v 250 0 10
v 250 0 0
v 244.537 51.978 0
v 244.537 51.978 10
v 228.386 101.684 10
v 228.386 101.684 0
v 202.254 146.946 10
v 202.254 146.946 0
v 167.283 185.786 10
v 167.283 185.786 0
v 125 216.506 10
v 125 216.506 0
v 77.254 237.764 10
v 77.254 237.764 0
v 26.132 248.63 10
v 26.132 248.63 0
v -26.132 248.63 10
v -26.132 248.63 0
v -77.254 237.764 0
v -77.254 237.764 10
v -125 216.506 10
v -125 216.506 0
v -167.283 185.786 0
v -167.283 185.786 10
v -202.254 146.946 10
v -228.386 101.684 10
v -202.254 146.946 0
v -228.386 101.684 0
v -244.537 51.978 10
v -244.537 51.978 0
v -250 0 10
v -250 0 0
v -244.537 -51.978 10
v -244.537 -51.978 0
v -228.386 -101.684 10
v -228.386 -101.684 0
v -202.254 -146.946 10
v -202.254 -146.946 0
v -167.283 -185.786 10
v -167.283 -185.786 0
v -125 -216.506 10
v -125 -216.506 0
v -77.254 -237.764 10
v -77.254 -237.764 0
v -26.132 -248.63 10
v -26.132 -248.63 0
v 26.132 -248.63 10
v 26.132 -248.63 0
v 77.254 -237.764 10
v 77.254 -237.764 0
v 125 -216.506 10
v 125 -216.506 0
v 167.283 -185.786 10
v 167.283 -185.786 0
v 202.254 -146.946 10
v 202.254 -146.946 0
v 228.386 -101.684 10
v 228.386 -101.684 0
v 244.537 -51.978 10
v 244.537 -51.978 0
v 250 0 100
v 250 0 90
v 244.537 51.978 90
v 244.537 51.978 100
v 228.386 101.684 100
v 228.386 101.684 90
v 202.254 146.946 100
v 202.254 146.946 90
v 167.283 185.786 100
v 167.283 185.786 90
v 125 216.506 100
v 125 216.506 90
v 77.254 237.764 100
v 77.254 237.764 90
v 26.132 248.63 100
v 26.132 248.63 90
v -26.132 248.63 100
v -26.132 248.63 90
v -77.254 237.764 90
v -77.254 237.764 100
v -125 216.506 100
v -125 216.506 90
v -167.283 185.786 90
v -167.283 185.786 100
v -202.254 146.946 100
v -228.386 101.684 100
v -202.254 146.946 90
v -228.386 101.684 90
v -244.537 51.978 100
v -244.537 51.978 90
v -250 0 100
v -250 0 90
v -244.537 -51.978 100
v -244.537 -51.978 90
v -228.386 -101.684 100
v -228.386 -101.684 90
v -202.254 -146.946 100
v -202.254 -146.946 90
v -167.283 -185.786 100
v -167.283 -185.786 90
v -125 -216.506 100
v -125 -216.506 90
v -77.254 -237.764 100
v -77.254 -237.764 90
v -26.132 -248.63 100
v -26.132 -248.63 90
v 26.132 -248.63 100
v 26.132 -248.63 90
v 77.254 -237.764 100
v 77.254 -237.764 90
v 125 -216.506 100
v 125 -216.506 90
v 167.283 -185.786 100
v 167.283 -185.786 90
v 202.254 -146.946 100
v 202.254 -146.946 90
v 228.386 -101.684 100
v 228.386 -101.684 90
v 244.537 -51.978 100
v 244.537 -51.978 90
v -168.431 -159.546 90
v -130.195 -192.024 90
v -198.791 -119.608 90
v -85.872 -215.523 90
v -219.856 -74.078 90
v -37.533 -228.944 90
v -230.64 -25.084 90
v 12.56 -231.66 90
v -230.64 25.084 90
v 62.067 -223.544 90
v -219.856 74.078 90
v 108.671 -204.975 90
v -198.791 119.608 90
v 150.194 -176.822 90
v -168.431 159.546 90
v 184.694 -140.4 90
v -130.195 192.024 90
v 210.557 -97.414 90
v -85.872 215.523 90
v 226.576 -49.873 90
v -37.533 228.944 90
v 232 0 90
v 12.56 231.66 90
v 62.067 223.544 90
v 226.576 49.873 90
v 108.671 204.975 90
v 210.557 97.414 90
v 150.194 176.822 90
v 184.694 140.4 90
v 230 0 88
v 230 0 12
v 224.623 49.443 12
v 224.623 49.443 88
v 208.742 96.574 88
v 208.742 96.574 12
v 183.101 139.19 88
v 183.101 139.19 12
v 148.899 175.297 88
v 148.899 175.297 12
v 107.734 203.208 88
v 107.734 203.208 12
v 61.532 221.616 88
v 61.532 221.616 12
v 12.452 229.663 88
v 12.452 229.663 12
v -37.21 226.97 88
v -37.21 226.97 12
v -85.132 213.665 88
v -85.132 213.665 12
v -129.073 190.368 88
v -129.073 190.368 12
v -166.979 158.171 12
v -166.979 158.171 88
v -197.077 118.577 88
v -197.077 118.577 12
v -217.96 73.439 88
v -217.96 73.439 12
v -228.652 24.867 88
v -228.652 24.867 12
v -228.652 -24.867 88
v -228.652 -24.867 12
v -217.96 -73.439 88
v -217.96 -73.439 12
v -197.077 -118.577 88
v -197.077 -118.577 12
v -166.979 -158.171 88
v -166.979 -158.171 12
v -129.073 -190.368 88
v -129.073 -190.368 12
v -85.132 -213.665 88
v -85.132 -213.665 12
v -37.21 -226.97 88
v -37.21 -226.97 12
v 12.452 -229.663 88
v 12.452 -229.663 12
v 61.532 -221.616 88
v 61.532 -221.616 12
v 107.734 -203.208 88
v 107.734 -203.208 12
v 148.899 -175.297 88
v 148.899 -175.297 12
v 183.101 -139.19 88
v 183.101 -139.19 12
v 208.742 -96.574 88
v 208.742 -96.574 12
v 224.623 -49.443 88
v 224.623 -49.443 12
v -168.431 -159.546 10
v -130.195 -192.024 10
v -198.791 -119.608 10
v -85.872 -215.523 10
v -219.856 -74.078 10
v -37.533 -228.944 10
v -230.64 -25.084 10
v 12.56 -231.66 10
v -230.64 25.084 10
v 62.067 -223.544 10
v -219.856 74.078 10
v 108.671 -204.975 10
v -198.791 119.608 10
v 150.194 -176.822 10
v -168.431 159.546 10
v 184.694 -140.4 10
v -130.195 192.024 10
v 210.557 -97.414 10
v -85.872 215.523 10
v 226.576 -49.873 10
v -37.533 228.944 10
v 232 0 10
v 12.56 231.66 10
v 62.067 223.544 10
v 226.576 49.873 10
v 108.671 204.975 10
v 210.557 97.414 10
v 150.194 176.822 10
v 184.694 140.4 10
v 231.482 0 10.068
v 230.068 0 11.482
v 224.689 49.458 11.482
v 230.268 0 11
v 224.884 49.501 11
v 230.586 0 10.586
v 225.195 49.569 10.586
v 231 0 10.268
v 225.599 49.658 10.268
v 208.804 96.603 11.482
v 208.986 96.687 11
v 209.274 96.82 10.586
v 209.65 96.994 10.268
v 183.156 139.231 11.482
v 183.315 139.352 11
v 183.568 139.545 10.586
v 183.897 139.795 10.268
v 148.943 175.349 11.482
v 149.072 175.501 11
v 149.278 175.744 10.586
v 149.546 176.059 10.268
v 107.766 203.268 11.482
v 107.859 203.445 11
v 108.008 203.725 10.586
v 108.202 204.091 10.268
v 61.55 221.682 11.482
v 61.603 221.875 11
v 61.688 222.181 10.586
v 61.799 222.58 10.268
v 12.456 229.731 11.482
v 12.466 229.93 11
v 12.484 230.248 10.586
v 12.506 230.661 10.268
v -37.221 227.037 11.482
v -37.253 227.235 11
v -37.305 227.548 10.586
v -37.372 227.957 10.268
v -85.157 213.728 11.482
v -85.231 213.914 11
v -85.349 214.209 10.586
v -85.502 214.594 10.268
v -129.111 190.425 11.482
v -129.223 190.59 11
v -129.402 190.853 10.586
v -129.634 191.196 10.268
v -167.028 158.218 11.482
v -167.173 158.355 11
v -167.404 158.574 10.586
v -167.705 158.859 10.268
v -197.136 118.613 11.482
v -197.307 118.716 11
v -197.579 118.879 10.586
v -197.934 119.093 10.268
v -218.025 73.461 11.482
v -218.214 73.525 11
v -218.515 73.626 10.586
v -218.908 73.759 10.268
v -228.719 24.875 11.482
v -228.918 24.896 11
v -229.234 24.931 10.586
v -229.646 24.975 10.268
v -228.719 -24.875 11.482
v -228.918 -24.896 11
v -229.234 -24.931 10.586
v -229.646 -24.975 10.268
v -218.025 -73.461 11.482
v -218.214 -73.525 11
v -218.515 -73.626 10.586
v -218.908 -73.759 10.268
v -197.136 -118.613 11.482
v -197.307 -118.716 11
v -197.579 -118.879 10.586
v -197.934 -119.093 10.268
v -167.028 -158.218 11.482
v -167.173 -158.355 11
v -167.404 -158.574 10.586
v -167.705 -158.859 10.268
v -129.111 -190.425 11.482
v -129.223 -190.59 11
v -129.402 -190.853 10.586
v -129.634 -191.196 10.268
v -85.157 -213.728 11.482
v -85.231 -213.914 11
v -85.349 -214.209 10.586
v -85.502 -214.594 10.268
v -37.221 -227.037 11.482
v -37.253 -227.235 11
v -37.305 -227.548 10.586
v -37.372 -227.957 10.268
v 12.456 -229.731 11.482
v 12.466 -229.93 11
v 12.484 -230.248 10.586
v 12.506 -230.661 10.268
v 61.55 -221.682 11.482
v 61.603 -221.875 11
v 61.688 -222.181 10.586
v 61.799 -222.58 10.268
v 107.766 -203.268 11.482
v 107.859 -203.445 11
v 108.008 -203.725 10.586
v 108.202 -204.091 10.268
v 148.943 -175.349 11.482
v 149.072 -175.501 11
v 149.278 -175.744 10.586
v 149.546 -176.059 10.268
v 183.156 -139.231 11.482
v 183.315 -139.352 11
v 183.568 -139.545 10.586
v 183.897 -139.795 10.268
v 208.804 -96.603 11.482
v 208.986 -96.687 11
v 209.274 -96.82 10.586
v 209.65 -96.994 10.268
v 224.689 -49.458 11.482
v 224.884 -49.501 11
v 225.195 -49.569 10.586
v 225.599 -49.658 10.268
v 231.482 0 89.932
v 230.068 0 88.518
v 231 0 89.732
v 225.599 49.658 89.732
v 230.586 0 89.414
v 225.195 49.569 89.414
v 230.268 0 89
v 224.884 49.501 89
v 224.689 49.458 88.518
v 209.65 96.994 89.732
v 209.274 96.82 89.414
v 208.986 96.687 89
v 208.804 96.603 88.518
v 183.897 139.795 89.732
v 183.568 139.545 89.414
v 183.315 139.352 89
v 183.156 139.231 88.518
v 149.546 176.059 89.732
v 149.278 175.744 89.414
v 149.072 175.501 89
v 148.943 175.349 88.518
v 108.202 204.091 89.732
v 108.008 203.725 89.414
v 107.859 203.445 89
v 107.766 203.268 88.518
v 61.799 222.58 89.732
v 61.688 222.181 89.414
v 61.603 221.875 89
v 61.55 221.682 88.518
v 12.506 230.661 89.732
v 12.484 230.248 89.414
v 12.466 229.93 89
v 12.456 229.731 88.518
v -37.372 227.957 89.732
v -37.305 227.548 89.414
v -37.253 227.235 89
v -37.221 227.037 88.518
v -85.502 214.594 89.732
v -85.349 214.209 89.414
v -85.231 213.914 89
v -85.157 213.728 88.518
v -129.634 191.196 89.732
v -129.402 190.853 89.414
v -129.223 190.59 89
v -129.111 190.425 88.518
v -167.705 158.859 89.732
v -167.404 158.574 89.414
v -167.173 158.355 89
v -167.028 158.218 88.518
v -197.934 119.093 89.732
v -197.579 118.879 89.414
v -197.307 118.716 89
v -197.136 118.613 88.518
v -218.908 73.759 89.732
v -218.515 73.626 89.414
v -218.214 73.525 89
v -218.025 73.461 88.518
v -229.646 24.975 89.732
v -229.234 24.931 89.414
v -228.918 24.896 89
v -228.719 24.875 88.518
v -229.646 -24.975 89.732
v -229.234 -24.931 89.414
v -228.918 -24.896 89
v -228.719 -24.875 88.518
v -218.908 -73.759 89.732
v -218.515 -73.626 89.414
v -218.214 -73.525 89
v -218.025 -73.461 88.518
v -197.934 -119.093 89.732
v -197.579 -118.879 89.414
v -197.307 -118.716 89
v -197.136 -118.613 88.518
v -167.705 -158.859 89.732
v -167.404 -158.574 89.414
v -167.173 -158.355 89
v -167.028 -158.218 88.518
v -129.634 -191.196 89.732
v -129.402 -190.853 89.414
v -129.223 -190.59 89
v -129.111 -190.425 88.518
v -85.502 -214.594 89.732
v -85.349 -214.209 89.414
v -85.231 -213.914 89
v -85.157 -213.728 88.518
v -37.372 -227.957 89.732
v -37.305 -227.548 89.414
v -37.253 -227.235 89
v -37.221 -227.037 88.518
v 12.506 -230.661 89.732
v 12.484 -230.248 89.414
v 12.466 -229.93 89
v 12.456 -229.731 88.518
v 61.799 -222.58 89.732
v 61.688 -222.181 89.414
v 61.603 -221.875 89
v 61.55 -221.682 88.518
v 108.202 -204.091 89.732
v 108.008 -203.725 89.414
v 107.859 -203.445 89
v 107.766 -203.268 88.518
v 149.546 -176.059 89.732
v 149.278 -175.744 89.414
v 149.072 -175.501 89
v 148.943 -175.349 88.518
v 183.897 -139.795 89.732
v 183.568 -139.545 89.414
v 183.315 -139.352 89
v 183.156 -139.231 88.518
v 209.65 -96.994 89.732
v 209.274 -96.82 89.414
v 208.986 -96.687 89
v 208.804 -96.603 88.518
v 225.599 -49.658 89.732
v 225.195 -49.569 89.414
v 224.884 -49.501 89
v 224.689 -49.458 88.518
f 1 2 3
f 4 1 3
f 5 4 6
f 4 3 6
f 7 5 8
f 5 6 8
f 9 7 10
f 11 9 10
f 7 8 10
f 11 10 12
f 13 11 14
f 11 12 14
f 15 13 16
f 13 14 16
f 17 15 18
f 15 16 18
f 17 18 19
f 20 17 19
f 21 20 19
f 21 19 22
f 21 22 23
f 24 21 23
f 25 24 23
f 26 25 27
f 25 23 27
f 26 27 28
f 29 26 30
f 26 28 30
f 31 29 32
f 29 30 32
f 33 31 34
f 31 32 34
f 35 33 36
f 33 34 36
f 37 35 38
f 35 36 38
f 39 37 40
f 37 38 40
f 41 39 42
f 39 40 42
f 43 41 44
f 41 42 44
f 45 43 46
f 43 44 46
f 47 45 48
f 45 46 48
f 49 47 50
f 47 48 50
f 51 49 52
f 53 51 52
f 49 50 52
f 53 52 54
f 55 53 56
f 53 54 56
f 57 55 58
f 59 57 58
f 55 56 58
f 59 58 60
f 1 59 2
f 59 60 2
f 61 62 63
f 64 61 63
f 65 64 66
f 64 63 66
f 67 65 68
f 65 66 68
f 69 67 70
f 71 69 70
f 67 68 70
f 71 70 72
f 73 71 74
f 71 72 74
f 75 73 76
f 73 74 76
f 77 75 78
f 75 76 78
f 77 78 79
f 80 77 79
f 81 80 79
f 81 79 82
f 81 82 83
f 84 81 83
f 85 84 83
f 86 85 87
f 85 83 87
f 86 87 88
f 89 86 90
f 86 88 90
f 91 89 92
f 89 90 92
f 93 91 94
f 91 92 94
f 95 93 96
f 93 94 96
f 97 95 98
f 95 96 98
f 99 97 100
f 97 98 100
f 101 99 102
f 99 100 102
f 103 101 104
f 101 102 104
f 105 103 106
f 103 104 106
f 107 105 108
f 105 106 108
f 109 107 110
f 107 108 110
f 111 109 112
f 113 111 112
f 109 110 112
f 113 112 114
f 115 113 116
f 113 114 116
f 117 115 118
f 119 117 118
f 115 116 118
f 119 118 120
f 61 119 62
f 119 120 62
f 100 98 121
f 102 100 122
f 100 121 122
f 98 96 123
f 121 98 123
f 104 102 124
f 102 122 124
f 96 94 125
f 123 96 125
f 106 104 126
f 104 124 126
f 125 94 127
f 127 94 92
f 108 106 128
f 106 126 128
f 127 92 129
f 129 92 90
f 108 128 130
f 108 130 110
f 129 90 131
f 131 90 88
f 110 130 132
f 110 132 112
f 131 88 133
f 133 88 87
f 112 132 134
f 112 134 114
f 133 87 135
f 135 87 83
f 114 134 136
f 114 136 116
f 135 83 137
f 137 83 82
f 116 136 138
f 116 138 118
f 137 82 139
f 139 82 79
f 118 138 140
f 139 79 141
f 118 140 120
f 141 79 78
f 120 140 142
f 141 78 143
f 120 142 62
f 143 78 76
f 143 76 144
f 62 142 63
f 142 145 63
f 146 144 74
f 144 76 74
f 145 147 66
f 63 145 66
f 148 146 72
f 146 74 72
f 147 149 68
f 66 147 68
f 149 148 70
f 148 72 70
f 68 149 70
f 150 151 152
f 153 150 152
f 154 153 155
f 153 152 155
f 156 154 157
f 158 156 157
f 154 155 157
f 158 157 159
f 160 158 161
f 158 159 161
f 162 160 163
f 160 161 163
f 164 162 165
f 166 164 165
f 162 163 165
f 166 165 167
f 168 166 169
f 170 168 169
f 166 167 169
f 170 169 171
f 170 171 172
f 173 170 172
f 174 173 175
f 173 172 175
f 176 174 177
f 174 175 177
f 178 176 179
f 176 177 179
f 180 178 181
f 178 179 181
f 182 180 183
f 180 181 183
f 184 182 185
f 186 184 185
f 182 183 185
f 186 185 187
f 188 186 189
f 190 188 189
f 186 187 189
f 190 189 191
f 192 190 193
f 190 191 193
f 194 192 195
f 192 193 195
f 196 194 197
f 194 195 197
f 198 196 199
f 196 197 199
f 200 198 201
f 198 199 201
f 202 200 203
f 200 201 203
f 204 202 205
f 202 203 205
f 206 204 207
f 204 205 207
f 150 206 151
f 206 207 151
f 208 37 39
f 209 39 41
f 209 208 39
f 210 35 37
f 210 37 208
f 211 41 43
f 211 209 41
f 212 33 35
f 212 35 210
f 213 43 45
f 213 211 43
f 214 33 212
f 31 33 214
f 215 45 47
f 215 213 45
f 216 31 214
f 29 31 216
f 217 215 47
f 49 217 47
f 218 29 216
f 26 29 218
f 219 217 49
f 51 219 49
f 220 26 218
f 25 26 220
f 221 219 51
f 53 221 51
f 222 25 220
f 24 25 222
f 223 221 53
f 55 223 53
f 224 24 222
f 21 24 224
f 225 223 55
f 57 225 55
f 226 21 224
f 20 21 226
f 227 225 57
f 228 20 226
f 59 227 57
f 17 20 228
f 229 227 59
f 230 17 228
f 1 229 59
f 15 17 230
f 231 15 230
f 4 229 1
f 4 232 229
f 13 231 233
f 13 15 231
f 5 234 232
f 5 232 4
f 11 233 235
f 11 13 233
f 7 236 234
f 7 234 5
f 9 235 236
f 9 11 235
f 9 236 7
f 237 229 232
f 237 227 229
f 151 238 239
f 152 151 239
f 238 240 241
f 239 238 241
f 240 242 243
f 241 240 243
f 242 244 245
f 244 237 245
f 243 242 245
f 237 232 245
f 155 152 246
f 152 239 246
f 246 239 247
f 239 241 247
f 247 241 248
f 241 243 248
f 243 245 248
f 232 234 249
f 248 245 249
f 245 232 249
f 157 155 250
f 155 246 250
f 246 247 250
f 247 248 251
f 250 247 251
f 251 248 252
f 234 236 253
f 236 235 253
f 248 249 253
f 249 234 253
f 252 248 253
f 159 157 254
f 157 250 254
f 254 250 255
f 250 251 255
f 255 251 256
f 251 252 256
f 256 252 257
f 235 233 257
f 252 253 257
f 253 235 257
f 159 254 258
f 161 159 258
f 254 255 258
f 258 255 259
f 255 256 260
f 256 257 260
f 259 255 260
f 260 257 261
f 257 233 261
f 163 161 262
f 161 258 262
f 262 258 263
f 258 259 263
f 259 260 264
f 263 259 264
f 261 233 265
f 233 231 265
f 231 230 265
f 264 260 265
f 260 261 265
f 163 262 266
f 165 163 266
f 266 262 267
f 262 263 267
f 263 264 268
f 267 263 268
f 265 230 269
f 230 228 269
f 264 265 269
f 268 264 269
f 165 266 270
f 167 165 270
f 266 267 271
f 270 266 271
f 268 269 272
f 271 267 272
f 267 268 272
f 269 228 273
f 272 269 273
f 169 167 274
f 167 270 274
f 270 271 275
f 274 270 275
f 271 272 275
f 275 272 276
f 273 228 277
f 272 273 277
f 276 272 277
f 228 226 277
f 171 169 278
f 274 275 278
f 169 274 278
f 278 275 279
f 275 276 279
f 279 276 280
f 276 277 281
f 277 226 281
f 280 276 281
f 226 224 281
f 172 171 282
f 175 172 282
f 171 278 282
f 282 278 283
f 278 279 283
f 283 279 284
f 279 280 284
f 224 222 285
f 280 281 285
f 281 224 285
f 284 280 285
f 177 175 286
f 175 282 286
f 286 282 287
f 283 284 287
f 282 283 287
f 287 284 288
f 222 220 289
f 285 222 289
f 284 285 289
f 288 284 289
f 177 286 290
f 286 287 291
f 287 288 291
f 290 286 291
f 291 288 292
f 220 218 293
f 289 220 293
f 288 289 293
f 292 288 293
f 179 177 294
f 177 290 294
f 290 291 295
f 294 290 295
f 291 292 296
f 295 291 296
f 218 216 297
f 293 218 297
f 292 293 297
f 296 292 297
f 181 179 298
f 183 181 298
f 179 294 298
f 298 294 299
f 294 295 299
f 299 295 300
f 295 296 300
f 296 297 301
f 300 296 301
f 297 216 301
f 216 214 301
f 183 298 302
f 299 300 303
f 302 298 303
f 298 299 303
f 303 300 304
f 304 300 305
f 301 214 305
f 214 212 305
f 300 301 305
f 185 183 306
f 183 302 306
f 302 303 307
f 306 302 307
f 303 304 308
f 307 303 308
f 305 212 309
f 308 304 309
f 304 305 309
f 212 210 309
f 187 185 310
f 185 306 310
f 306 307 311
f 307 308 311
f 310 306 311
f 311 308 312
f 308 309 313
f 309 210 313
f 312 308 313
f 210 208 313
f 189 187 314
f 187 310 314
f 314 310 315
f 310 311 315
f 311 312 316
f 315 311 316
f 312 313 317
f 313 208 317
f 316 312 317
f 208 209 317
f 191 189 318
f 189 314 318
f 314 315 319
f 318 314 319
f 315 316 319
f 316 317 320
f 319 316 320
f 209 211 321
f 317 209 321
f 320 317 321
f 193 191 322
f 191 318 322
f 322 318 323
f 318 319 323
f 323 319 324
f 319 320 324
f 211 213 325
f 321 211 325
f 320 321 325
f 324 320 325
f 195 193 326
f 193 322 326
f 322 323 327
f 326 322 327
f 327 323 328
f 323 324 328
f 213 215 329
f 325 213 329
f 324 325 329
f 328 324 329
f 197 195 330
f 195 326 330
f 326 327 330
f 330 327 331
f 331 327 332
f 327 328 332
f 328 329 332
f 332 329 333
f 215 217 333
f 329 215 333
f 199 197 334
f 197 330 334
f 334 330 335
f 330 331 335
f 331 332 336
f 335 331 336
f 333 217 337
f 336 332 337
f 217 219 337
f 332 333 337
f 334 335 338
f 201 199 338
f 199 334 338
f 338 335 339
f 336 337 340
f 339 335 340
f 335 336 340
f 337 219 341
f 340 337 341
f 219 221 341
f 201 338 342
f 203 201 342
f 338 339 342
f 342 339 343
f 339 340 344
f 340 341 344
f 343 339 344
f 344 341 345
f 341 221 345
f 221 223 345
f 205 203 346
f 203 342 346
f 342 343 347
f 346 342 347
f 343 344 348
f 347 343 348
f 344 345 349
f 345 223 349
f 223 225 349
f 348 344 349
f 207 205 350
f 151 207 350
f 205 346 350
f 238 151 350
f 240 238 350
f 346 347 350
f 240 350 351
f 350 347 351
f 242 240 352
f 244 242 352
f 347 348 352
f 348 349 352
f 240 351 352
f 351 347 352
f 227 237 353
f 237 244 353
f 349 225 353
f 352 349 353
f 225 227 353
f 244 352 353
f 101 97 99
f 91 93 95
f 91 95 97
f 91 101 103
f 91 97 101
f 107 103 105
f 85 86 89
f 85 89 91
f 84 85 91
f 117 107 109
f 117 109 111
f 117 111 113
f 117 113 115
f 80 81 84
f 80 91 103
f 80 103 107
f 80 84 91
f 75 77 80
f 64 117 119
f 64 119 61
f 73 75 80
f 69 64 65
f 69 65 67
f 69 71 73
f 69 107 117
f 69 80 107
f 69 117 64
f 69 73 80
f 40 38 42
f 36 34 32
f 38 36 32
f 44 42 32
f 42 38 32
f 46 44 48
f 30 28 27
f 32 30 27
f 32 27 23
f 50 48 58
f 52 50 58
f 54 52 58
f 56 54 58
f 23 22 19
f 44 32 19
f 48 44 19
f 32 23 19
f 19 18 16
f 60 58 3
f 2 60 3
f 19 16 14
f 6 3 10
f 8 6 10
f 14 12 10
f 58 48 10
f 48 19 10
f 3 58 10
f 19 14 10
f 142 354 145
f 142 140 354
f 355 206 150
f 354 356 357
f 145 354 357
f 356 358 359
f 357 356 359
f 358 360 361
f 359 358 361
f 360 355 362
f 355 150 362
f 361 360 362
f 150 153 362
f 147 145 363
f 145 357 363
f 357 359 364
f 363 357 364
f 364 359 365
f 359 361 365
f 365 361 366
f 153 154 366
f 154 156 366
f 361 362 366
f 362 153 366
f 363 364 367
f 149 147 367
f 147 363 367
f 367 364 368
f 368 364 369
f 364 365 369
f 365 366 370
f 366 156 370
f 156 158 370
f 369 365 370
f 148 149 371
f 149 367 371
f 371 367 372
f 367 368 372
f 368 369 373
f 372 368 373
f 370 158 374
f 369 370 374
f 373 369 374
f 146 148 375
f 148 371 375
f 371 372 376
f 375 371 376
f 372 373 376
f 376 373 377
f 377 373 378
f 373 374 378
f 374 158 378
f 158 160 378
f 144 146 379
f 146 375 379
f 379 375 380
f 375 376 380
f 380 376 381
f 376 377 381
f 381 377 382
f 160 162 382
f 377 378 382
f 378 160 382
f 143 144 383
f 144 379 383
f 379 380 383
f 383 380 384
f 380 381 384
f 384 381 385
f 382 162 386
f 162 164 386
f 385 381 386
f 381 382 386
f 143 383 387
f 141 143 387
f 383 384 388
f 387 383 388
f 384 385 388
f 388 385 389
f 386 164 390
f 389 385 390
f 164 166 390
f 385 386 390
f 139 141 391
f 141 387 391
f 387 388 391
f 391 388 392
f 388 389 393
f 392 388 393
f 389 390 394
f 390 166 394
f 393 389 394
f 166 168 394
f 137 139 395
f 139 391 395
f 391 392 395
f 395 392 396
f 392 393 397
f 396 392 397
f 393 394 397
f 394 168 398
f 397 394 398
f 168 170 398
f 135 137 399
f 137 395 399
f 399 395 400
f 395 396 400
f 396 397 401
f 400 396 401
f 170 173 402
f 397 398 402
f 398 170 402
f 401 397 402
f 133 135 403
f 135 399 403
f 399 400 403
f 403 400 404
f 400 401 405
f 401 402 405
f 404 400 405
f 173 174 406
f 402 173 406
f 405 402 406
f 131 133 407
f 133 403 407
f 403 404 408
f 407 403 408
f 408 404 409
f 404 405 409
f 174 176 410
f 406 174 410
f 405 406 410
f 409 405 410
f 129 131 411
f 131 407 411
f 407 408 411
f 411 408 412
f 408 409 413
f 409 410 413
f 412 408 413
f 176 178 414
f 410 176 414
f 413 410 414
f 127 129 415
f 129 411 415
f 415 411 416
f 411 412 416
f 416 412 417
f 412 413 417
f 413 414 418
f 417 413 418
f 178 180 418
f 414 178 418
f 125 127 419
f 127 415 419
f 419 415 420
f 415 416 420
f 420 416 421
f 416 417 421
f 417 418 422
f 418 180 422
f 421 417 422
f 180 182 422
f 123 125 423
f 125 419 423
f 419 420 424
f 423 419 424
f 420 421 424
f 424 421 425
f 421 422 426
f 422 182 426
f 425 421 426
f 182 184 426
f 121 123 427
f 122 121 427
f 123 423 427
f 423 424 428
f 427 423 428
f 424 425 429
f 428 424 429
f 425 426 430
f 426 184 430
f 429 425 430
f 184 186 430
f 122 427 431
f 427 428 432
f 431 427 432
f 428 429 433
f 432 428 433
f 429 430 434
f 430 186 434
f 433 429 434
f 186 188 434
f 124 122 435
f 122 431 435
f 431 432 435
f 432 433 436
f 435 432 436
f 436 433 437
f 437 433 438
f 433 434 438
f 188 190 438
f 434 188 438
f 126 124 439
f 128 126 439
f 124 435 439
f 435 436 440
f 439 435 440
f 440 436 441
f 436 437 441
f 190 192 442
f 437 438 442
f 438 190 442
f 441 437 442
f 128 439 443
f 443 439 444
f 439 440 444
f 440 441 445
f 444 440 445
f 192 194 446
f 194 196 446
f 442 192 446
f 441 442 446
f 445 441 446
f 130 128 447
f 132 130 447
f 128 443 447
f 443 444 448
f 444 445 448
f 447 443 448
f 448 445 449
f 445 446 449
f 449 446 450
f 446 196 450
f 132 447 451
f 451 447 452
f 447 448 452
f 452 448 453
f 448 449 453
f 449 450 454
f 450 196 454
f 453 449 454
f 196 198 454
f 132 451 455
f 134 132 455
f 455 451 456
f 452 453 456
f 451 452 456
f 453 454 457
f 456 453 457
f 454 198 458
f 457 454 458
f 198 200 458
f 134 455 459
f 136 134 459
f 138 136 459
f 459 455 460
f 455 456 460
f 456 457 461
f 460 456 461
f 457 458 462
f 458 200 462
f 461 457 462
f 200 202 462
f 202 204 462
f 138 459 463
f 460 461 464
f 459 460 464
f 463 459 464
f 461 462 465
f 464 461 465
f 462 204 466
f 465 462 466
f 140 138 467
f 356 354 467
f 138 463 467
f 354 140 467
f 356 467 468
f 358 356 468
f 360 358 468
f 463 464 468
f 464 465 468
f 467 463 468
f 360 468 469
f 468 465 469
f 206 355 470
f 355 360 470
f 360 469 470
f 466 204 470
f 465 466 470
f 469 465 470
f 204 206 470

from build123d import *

# Parameters (mm, degrees)
F0_R     = 250
F1_DEPTH = 10
F2_R     = 230
F3_DEPTH = 80
F4_R     = 250
F5_DEPTH = 10
F6_R     = 2


with BuildPart() as f1:
    # F0 (on Top) → F1 (new body)
    with BuildSketch(Plane.XY):
        Circle(F0_R)
    extrude(amount=F1_DEPTH)

    # F2 (on face) → F3 (join)
    with BuildSketch(Plane.XY.offset(10)):
        Circle(F2_R)
    extrude(amount=F3_DEPTH)

    # F4 (on face) → F5 (join)
    with BuildSketch(Plane.XY.offset(90)):
        Circle(F4_R)
    extrude(amount=F5_DEPTH)

    # F6
    f6_edges = [f1.edges().sort_by_distance(p)[0] for p in [
        (230, 0, 50),
        (-230, 0, 10),
        (-230, 0, 90),
    ]]
    fillet(f6_edges, radius=F6_R)


solid = f1.part
